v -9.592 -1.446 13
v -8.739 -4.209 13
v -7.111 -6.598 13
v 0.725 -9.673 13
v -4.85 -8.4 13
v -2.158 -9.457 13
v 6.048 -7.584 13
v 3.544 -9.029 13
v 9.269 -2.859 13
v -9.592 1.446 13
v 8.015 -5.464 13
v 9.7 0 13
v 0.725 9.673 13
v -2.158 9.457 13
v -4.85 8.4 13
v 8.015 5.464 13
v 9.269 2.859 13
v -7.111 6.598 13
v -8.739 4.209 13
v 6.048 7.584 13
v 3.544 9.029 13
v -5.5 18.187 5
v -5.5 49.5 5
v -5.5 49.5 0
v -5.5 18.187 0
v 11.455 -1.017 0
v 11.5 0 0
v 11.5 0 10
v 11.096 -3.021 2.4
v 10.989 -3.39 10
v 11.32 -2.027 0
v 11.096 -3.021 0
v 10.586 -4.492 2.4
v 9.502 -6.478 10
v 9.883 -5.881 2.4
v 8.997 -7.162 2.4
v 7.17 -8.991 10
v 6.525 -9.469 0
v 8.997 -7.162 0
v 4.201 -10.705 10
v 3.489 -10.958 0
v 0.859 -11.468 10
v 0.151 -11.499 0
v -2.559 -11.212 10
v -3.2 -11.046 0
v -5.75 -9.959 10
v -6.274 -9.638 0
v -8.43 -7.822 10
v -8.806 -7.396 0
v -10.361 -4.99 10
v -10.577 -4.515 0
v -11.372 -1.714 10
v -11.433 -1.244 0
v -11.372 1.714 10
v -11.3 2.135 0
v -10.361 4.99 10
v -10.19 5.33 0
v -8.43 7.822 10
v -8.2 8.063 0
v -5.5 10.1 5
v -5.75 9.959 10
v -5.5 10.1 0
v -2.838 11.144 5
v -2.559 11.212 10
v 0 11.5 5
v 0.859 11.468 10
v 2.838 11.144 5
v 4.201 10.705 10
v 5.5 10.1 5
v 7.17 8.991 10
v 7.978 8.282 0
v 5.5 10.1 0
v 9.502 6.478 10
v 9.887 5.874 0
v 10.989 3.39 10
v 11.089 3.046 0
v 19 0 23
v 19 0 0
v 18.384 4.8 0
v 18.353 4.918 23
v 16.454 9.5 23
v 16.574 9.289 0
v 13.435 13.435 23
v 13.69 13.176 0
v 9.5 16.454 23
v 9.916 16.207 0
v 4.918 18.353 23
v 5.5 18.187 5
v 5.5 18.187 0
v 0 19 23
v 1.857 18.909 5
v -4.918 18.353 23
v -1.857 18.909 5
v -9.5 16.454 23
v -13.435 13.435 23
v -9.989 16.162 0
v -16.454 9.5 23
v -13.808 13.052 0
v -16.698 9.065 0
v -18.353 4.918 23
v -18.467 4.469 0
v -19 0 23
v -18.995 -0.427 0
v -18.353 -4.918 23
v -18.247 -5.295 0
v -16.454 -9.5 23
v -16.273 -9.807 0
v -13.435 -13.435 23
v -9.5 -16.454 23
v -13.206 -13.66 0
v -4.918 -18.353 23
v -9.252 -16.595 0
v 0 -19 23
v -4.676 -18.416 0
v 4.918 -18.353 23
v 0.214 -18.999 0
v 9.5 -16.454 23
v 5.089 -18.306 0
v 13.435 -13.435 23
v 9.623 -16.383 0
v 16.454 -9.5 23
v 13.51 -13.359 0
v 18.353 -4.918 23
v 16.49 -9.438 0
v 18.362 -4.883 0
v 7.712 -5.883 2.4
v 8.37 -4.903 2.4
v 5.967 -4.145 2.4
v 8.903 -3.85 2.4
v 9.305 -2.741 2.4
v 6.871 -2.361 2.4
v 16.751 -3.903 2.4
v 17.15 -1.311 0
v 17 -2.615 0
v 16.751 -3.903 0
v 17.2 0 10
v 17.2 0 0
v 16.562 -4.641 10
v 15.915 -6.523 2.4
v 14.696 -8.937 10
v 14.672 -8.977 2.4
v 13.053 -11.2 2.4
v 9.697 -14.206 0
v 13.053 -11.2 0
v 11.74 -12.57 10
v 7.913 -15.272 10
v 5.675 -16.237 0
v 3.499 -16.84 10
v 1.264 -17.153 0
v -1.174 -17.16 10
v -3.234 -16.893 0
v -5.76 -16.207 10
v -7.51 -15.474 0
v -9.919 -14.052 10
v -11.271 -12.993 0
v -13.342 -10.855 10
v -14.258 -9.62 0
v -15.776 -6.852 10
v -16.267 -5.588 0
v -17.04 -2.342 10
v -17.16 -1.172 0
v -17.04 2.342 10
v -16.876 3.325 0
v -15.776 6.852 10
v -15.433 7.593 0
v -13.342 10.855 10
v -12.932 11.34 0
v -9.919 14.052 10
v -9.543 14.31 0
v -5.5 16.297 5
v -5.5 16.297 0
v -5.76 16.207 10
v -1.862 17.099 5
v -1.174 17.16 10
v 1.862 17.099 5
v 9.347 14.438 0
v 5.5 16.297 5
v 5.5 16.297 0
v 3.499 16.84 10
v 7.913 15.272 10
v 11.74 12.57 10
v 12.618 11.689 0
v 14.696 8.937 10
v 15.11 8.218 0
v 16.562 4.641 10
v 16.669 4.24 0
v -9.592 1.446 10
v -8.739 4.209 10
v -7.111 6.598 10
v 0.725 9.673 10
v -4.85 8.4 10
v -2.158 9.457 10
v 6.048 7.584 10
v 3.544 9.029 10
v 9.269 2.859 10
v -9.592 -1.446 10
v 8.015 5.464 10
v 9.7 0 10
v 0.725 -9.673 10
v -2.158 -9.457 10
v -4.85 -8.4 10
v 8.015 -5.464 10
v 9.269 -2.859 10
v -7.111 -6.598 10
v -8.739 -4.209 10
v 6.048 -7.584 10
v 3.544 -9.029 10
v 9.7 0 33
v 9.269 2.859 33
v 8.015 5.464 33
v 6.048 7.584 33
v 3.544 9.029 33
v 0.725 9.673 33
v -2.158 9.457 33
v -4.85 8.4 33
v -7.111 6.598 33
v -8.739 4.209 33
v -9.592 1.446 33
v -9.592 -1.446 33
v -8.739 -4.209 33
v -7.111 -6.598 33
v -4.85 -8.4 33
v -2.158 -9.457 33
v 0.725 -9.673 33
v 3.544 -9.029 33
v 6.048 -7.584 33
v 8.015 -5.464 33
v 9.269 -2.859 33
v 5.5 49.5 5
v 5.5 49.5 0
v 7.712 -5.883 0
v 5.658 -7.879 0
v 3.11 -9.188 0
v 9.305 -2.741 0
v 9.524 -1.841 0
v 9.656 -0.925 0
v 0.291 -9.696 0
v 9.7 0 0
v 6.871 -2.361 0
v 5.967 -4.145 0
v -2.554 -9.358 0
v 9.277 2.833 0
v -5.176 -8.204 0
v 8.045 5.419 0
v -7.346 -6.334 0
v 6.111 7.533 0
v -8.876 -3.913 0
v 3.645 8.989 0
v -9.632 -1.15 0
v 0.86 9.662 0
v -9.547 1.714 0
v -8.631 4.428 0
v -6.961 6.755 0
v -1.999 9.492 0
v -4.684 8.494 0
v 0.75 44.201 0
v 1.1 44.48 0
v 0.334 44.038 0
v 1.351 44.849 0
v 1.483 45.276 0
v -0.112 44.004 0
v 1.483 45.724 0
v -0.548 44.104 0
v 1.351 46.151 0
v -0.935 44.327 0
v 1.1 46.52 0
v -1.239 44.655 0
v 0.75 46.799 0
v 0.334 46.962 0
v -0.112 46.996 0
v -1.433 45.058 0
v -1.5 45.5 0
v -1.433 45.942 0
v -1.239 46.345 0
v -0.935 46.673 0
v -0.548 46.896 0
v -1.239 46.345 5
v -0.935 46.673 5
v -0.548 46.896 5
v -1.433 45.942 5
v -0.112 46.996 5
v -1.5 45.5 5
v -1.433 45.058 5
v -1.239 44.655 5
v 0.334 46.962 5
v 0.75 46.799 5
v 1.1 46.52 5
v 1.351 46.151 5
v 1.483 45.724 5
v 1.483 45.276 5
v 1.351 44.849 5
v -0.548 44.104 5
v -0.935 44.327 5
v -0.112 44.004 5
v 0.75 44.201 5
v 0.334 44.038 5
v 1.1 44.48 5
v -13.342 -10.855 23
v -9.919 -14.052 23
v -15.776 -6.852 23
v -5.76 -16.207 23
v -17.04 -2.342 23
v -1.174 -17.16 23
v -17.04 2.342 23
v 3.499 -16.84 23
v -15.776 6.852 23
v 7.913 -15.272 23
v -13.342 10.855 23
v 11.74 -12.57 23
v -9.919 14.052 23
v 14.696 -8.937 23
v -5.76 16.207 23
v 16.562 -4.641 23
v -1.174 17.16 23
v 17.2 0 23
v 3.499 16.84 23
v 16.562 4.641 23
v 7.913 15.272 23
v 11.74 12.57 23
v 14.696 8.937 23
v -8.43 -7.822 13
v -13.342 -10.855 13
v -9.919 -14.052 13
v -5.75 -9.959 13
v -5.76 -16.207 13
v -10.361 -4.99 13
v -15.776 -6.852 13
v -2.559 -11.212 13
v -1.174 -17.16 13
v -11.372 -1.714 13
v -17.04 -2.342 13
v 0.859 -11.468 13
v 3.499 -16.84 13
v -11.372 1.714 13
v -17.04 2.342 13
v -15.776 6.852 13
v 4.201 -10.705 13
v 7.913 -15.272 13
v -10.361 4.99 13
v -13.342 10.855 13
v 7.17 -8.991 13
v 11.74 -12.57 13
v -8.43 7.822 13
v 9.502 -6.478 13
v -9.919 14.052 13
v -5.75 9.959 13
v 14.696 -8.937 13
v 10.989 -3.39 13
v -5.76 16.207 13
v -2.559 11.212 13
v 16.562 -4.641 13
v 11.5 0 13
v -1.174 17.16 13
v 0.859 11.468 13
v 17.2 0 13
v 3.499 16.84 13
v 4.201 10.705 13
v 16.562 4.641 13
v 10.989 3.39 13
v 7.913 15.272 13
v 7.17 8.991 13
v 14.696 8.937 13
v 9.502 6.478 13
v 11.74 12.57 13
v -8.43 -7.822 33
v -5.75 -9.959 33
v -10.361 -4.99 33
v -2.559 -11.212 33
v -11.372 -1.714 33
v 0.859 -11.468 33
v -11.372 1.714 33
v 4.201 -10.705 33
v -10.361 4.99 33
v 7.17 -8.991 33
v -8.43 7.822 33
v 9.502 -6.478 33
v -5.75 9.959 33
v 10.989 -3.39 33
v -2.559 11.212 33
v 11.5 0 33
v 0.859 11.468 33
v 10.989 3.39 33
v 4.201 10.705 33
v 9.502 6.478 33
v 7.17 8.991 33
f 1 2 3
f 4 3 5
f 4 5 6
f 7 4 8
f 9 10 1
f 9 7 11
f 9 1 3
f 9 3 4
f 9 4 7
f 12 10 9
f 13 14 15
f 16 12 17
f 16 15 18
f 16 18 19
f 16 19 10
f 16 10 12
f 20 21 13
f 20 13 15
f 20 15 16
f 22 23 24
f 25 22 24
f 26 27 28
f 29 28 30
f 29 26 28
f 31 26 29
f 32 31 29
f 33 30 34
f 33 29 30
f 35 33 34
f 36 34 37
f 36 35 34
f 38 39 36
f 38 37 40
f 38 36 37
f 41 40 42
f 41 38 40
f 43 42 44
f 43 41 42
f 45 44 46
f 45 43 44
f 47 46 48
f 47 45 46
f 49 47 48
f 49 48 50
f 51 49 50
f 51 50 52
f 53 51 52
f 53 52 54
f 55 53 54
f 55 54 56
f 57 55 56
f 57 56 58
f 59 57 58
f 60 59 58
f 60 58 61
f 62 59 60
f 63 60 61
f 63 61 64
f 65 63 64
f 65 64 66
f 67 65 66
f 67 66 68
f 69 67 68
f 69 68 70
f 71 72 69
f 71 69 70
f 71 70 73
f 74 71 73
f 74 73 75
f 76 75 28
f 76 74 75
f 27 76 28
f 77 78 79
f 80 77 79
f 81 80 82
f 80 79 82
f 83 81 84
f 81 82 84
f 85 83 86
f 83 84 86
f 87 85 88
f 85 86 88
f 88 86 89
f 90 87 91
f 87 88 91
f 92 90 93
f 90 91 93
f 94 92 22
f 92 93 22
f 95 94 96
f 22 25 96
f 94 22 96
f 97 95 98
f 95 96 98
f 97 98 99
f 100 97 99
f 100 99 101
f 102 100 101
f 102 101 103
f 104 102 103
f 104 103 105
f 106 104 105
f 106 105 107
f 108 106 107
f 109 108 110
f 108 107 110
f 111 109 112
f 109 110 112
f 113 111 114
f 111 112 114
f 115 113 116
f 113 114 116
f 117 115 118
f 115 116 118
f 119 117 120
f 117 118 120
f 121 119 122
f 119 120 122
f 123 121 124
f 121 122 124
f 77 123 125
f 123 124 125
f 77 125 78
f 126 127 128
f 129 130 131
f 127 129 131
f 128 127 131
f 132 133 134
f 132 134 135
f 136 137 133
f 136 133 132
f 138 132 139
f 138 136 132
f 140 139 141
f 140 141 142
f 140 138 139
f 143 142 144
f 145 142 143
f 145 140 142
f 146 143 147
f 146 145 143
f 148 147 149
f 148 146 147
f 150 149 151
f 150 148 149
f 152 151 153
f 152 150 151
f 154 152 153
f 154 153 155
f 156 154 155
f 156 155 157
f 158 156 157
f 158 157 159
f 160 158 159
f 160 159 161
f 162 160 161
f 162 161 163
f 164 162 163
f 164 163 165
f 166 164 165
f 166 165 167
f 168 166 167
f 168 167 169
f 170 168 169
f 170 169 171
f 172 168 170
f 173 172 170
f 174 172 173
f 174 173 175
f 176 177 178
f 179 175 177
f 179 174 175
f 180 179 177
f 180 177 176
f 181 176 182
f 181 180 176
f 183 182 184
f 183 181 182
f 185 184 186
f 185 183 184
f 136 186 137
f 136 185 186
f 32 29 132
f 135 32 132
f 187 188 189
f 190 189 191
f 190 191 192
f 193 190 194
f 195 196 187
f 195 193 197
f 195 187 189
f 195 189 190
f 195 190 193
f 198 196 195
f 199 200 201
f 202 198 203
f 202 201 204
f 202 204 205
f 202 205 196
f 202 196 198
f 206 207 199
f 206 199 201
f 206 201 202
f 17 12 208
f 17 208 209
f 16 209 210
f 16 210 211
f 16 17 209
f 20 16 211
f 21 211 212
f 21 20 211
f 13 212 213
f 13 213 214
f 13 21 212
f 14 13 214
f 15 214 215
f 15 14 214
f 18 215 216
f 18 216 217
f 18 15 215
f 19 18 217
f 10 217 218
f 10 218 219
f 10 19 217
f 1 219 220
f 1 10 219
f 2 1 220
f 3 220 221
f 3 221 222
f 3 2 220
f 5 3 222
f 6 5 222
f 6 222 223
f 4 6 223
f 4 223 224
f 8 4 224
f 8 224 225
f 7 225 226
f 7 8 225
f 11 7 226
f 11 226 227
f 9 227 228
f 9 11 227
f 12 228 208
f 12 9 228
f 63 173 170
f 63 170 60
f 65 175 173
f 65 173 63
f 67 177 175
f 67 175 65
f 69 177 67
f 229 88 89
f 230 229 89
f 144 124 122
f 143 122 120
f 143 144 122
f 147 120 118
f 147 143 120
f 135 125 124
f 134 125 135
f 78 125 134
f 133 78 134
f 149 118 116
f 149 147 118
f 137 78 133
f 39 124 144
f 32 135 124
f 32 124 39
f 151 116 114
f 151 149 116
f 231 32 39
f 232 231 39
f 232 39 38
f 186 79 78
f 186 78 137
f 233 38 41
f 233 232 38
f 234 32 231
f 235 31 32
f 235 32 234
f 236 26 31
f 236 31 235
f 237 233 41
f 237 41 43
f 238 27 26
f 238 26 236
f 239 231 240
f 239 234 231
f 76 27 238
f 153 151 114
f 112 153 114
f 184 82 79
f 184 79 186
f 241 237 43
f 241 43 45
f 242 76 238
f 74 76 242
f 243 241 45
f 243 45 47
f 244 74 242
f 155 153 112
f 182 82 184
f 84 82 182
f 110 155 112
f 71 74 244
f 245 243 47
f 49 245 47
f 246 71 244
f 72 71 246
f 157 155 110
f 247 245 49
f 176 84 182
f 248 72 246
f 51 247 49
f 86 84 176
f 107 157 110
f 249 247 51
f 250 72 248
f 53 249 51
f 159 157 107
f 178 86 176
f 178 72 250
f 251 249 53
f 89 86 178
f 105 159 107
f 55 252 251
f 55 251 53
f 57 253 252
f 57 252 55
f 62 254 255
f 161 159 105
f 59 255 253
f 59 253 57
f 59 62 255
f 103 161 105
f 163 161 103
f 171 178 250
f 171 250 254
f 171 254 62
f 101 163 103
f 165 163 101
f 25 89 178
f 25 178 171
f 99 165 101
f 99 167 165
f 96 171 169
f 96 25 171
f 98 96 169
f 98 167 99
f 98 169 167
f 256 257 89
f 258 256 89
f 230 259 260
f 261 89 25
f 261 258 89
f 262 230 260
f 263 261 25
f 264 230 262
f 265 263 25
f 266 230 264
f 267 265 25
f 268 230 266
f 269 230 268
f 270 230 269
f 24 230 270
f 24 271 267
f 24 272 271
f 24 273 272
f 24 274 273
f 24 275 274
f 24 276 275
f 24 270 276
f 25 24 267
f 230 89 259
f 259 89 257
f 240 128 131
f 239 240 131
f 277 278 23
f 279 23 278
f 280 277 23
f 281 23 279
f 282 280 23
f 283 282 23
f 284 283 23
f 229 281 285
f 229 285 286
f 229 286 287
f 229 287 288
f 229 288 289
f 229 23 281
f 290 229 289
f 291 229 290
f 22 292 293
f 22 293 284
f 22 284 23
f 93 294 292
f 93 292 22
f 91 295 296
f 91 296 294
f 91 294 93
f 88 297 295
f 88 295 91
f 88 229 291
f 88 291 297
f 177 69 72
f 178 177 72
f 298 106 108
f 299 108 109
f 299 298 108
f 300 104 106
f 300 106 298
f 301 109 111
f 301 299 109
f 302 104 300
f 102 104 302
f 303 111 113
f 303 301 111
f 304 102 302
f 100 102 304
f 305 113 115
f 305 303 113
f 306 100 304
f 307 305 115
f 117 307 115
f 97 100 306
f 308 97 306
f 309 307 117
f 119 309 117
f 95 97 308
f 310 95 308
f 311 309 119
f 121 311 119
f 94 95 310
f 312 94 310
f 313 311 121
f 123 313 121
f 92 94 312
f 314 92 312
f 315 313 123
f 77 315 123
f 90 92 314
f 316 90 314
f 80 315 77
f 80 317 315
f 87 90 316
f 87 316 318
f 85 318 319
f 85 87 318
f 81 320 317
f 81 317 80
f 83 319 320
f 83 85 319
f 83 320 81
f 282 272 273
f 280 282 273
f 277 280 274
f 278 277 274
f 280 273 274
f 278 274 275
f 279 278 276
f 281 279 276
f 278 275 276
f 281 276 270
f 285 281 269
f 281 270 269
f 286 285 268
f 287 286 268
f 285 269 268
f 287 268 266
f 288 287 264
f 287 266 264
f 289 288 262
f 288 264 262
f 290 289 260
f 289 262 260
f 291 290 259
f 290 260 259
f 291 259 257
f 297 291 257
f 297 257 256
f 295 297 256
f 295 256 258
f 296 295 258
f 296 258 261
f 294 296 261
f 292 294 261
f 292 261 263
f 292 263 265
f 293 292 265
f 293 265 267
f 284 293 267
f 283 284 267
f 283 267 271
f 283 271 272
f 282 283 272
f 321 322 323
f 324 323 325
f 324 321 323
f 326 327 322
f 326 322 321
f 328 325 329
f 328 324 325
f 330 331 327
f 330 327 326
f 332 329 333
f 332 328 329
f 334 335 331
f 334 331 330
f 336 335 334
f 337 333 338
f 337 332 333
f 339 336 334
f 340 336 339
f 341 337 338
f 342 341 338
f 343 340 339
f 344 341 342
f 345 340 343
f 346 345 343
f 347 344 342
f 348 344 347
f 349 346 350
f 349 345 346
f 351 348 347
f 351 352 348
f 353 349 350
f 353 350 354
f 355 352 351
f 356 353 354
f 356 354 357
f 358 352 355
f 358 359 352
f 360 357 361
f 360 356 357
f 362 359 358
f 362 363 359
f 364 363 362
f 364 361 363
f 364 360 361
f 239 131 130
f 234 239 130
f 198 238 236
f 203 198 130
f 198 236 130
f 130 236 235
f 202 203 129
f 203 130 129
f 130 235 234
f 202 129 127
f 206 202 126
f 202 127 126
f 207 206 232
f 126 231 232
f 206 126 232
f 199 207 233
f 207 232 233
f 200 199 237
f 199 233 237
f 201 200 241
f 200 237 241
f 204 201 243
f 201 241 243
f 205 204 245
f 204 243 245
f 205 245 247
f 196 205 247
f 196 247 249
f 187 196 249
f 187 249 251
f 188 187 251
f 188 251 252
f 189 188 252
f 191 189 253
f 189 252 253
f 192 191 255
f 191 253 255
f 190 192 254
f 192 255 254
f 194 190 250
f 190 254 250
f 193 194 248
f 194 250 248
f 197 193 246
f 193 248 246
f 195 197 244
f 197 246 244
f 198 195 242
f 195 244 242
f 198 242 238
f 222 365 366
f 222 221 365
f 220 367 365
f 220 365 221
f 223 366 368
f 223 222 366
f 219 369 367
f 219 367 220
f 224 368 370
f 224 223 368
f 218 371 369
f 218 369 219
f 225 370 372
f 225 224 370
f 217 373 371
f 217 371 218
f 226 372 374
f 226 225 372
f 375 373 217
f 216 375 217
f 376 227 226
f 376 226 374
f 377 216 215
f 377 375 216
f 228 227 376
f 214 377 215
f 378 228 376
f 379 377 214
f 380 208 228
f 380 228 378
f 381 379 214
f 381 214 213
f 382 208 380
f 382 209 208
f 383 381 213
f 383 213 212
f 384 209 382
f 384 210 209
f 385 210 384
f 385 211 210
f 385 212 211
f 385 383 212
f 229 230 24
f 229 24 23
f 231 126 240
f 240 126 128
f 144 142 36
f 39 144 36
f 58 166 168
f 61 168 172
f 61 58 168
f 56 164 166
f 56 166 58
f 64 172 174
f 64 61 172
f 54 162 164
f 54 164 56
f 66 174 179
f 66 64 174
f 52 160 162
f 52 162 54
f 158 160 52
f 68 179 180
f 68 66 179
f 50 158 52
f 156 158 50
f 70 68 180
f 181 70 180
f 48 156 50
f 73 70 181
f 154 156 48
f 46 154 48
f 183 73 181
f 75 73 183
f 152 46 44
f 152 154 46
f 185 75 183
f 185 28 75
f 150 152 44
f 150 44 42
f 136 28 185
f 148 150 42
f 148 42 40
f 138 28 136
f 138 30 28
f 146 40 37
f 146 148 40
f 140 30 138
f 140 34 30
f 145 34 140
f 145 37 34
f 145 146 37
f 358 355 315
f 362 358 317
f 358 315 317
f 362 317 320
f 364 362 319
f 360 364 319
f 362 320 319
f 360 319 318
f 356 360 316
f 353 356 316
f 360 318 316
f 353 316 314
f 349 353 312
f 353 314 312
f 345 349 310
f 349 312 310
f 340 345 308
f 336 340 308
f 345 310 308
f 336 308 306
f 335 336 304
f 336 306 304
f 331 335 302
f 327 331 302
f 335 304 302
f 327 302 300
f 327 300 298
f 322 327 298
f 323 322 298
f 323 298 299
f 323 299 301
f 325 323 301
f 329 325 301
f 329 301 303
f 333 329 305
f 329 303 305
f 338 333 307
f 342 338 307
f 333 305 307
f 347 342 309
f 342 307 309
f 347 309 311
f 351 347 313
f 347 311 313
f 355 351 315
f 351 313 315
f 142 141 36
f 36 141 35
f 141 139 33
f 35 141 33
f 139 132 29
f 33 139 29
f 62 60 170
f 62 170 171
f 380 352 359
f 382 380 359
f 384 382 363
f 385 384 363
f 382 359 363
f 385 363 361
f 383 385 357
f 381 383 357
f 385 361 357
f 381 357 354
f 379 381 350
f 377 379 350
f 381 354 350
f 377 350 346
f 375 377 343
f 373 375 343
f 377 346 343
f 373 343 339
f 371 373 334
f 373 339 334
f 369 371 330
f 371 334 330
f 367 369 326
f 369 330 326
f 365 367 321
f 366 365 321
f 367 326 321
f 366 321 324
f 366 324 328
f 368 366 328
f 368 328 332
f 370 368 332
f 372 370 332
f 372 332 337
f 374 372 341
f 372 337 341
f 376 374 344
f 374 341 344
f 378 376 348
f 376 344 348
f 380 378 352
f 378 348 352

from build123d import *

# Parameters (mm, degrees)
CROQUIS1_R              = 19
SALIENTE_EXTRUIR1_DEPTH = 23
CROQUIS2_R              = 17.2
CORTAR_EXTRUIR1_DEPTH   = 10
CROQUIS3_R              = 11.5
CROQUIS3_R_2            = 9.7
SALIENTE_EXTRUIR2_DEPTH = 20
CORTAR_EXTRUIR3_START   = -10
CROQUIS4_R              = 17.2
CORTAR_EXTRUIR3_DEPTH   = 10
SALIENTE_EXTRUIR3_START = 10
CROQUIS5_R              = 11.5
CROQUIS5_R_2            = 9.7
SALIENTE_EXTRUIR3_DEPTH = 10
SALIENTE_EXTRUIR4_DEPTH = 5.5
SALIENTE_EXTRUIR5_START = -2.4
SALIENTE_EXTRUIR5_DEPTH = 2.4
CROQUIS8_R              = 1.5
CORTAR_EXTRUIR4_DEPTH   = 63.451981554


with BuildPart() as part:
    # Croquis1 → Saliente-Extruir1 (new body)
    with BuildSketch(Plane.XY):
        Circle(CROQUIS1_R)
    extrude(amount=SALIENTE_EXTRUIR1_DEPTH)

    # Croquis2 → Cortar-Extruir1 (cut)
    with BuildSketch(Plane.XY.offset(23)):
        Circle(CROQUIS2_R)
    extrude(amount=-CORTAR_EXTRUIR1_DEPTH, mode=Mode.SUBTRACT)

    # Croquis3 → Saliente-Extruir2 (add)
    with BuildSketch(Plane.XY.offset(13)):
        Circle(CROQUIS3_R)
        Circle(CROQUIS3_R_2, mode=Mode.SUBTRACT)
    extrude(amount=SALIENTE_EXTRUIR2_DEPTH)

    # Croquis4 → Cortar-Extruir3 (cut)
    with BuildSketch(Plane(origin=(0, 0, 0), x_dir=(-1, 0, 0), z_dir=(0, 0, -1)).offset(CORTAR_EXTRUIR3_START)):
        with Locations(Location((0, 0, 0), (0, 0, 180))):
            Circle(CROQUIS4_R)
    extrude(amount=CORTAR_EXTRUIR3_DEPTH, mode=Mode.SUBTRACT)

    # Croquis5 → Saliente-Extruir3 (add)
    with BuildSketch(Plane(origin=(0, 0, 10), x_dir=(-1, 0, 0), z_dir=(0, 0, -1)).offset(SALIENTE_EXTRUIR3_START)):
        with Locations(Location((0, 0, 0), (0, 0, 180))):
            Circle(CROQUIS5_R)
        with Locations(Location((0, 0, 0), (0, 0, 180))):
            Circle(CROQUIS5_R_2, mode=Mode.SUBTRACT)
    extrude(amount=-SALIENTE_EXTRUIR3_DEPTH)

    # Croquis6 → Saliente-Extruir4 (add, symmetric)
    with BuildSketch(Plane(origin=(0, 0, 0), x_dir=(0, 0, -1), z_dir=(1, 0, 0))):
        Polygon((-5, 10.008599435), (0, 10.008599435), (0, 10.702416301), (0, 11.5), (0, 49.5), (-5, 49.5), (-5, 11.5), (-5, 10.702416301), align=None)
    extrude(amount=SALIENTE_EXTRUIR4_DEPTH, both=True)

    # Croquis7 → Saliente-Extruir5 (add)
    with BuildSketch(Plane(origin=(0, 0, 0), x_dir=(-1, 0, 0), z_dir=(0, 0, -1)).offset(SALIENTE_EXTRUIR5_START)):
        with BuildLine():
            Line((-13.053420517, -11.200366637), (-5.966841039, -4.144844594))
            Line((-5.966841039, -4.144844594), (-6.870906384, -2.360841833))
            Line((-6.870906384, -2.360841833), (-16.751201418, -3.903492163))
            ThreePointArc((-16.751201418, -3.903492163), (-15.342423747, -7.774961965), (-13.053420517, -11.200366637))
        make_face()
    extrude(amount=SALIENTE_EXTRUIR5_DEPTH)

    # Croquis8 → Cortar-Extruir4 (cut, through all)
    with BuildSketch(Plane(origin=(0, 0, 0), x_dir=(-1, 0, 0), z_dir=(0, 0, -1))):
        with Locations((0, 45.5)):
            Circle(CROQUIS8_R)
    extrude(amount=-CORTAR_EXTRUIR4_DEPTH, mode=Mode.SUBTRACT)


solid = part.part
